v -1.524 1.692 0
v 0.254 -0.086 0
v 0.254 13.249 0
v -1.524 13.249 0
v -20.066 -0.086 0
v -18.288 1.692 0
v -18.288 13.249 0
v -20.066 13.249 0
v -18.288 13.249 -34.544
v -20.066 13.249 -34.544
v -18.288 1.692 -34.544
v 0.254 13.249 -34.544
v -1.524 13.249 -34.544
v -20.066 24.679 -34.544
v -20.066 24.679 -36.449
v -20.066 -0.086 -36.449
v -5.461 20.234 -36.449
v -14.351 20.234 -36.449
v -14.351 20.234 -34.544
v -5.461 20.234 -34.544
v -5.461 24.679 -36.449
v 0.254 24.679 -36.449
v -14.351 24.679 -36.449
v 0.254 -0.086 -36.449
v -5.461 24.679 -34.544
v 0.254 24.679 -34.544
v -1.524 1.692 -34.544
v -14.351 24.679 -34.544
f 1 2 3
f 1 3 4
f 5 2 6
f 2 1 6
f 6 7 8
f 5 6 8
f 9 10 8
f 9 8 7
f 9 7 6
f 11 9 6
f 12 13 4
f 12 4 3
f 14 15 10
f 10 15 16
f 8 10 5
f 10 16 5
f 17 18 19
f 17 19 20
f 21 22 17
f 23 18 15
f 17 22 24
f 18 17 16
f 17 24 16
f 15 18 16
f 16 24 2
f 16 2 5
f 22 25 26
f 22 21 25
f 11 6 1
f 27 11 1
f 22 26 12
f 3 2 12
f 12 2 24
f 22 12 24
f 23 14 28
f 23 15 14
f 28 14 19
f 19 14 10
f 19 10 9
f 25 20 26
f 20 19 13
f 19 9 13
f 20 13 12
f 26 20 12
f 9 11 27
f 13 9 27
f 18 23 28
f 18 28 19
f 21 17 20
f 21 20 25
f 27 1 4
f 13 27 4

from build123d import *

# Parameters (mm, degrees)
BOSS_EXTRUDE1_DEPTH = 36.449
SKETCH3_W           = 16.764
SKETCH3_H           = 1.905
BOSS_EXTRUDE3_DEPTH = 11.557
BOSS_EXTRUDE4_DEPTH = 11.43
CUT_EXTRUDE1_REACH  = 38.449


with BuildPart() as part:
    # Sketch1 → Boss-Extrude1 (new body)
    with BuildSketch(Plane.XY):
        Polygon((-1.524, 1.692251565), (-1.524, 13.249251565), (0.254, 13.249251565), (0.254, -0.085748435), (-20.066, -0.085748435), (-20.066, 13.249251565), (-18.288, 13.249251565), (-18.288, 1.692251565), align=None)
    extrude(amount=-BOSS_EXTRUDE1_DEPTH)

    # Sketch3 → Boss-Extrude3 (add)
    with BuildSketch(Plane(origin=(0, 1.692251565, 0), x_dir=(1, 0, 0), z_dir=(0, 1, 0))):
        with Locations((-9.906, 35.4965)):
            Rectangle(SKETCH3_W, SKETCH3_H)
    extrude(amount=BOSS_EXTRUDE3_DEPTH)

    # Sketch4 → Boss-Extrude4 (add)
    with BuildSketch(Plane(origin=(0, 13.249251565, 0), x_dir=(1, 0, 0), z_dir=(0, 1, 0))):
        Polygon((-9.906, 34.544), (0.254, 34.544), (0.254, 36.449), (-20.066, 36.449), (-20.066, 34.544), align=None)
    extrude(amount=BOSS_EXTRUDE4_DEPTH)

    # Sketch5 → Cut-Extrude1 (cut, up to next)
    with BuildSketch(Plane(origin=(0, 0, -36.449), x_dir=(-1, 0, 0), z_dir=(0, 0, -1)), mode=Mode.PRIVATE) as cut_extrude1_sk1:
        Polygon((9.906, 24.679251565), (14.351, 24.679251565), (14.351, 20.234251565), (5.461, 20.234251565), (5.461, 24.679251565), align=None)
    cut_extrude1_tool1 = extrude(cut_extrude1_sk1.sketch, amount=-CUT_EXTRUDE1_REACH, mode=Mode.PRIVATE) & part.part
    add(cut_extrude1_tool1.solids().sort_by_distance((-9.906, 22.456752, -36.449))[0], mode=Mode.SUBTRACT)


solid = part.part
